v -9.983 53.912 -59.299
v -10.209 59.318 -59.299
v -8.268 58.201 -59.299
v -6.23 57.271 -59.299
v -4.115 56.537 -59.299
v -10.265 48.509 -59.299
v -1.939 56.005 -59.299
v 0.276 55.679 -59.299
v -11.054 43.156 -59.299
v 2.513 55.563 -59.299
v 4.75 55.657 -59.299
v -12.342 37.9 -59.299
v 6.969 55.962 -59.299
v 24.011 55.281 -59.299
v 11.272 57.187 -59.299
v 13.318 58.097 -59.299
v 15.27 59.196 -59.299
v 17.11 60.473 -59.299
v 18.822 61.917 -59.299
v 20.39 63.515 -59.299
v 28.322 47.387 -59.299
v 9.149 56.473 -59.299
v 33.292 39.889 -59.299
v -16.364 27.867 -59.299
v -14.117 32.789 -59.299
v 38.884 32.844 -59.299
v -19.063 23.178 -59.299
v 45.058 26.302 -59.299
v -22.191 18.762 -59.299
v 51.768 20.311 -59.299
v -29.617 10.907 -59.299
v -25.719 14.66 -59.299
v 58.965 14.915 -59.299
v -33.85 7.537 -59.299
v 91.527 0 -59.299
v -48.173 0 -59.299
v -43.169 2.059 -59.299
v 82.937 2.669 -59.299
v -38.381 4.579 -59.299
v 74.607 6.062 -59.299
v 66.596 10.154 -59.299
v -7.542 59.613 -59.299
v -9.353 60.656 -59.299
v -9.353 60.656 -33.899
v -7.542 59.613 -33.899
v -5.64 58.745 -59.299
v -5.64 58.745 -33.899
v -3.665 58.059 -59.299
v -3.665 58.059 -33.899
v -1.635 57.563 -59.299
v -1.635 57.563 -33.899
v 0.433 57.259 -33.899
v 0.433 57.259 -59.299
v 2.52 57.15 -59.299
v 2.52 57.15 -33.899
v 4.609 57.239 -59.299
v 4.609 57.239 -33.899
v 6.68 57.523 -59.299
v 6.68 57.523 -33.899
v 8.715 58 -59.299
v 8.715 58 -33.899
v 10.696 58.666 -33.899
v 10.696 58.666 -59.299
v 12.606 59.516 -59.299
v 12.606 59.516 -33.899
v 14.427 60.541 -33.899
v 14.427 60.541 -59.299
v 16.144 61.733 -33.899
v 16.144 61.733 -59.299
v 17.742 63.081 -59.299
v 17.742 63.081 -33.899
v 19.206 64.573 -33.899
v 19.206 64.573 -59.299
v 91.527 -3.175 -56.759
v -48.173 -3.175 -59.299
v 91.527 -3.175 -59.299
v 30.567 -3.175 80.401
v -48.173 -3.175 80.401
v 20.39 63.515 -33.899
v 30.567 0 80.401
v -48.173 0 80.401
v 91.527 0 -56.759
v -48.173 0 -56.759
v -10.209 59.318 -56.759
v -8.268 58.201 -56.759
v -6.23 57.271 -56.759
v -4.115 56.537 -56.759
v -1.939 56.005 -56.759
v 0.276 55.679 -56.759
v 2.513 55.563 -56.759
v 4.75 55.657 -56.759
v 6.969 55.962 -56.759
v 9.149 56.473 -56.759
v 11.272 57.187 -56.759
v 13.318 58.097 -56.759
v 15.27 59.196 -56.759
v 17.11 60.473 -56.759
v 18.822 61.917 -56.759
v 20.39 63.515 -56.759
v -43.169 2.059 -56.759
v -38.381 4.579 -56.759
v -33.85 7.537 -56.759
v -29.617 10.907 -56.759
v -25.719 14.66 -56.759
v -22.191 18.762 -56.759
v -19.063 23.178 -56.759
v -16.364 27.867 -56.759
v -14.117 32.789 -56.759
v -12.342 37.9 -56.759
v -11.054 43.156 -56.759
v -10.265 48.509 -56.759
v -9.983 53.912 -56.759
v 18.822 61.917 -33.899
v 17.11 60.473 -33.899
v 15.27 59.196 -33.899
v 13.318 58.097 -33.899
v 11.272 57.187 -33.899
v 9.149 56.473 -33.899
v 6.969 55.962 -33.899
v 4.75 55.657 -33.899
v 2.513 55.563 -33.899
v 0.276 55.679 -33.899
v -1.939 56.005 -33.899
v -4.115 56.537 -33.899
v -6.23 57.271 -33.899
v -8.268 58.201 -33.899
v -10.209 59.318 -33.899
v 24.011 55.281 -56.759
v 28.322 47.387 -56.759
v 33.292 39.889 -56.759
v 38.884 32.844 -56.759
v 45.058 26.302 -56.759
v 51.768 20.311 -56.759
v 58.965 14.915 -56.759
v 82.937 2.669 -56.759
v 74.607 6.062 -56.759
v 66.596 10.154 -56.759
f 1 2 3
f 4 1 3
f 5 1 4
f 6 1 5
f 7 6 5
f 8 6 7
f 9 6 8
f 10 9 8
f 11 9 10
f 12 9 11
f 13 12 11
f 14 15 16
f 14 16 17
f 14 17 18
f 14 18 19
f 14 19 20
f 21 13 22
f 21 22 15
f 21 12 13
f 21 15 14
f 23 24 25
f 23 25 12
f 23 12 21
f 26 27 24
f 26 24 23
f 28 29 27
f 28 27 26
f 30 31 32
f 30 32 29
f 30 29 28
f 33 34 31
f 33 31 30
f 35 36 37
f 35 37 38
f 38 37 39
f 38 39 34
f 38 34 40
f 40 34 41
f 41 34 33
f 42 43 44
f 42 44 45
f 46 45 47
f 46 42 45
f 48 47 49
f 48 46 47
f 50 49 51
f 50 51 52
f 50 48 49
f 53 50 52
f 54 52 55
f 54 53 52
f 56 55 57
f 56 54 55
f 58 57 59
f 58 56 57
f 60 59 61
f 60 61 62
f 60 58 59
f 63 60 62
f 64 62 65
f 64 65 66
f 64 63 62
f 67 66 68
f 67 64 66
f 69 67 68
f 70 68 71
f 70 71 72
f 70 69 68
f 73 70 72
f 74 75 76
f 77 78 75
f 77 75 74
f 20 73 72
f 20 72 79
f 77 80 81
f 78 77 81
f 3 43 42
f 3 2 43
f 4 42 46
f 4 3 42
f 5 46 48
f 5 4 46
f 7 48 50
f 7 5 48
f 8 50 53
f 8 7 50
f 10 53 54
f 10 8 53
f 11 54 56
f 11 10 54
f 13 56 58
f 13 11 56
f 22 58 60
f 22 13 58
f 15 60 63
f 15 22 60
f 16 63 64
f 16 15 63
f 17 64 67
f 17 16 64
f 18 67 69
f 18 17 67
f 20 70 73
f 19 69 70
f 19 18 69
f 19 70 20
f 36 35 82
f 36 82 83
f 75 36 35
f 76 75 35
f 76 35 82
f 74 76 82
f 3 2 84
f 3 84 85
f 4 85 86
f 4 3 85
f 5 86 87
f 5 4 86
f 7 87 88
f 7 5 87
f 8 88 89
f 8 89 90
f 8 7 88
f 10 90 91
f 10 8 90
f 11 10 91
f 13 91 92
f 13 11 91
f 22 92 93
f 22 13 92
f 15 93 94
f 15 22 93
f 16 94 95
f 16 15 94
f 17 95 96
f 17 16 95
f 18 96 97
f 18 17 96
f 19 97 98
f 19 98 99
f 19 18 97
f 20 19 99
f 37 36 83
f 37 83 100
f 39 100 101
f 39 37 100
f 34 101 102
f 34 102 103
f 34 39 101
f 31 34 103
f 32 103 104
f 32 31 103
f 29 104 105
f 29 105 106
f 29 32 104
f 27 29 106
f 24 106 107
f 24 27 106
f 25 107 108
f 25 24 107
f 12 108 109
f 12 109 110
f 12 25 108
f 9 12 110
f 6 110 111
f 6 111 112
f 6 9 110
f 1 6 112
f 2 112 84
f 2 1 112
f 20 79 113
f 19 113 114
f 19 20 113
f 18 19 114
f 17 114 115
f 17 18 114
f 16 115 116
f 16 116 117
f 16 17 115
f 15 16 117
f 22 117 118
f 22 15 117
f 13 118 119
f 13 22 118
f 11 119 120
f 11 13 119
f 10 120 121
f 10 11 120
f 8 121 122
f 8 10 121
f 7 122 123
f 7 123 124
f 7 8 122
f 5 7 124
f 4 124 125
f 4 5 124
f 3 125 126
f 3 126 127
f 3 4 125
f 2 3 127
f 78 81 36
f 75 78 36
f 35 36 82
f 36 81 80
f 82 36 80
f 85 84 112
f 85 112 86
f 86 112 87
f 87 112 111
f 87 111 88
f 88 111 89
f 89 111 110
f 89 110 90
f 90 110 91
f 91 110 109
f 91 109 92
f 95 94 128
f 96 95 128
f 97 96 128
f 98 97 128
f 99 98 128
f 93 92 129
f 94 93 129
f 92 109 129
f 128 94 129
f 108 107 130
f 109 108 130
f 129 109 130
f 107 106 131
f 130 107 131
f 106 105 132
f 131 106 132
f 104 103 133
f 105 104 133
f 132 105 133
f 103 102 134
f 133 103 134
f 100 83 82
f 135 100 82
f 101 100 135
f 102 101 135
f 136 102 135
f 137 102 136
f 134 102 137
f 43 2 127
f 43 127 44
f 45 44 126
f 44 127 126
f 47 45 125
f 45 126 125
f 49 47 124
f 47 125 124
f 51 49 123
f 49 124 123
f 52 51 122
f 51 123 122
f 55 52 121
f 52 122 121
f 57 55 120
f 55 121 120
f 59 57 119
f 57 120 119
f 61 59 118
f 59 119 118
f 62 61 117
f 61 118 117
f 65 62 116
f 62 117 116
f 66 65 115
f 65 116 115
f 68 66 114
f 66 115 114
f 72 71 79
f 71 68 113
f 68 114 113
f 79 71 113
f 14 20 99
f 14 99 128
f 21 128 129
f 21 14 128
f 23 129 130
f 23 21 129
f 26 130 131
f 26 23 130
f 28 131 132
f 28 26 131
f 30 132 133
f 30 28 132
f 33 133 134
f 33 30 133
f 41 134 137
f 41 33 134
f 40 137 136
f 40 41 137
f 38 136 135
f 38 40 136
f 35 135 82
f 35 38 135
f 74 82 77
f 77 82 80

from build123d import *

# Parameters (mm, degrees)
F1_DEPTH = 3.175
F3_DEPTH = 25.4
F5_DEPTH = 2.54


with BuildPart() as f1:
    # F0 (on Front) → F1 (new body)
    with BuildSketch(Plane.XZ):
        Polygon((-48.172619, 80.400523), (-48.172619, -59.299477), (91.527381, -59.299477), (91.527381, -56.759477), (30.567381, 80.400523), align=None)
    extrude(amount=F1_DEPTH)


with BuildPart() as f3:
    # F2 (on face) → F3 (new body)
    with BuildSketch(Plane(origin=(0, 0, -59.299477), x_dir=(1, 0, 0), z_dir=(0, 0, -1))):
        with BuildLine():
            ThreePointArc((-9.353087, -60.655518), (5.647591, -57.356168), (19.205846, -64.5728))
            Line((19.205846, -64.5728), (20.390022, -63.515499))
            ThreePointArc((20.390022, -63.515499), (5.86332, -55.783394), (-10.208835, -59.318412))
            Line((-10.208835, -59.318412), (-9.353087, -60.655518))
        make_face()
    extrude(amount=-F3_DEPTH)


with BuildPart() as f5:
    # F4 (on face) → F5 (new body)
    with BuildSketch(Plane(origin=(0, 0, -59.299477), x_dir=(1, 0, 0), z_dir=(0, 0, -1))):
        with BuildLine():
            ThreePointArc((-48.172619, 0), (-19.063419, -23.177729), (-10.208835, -59.318412))
            ThreePointArc((-10.208835, -59.318412), (5.86332, -55.783394), (20.390022, -63.515499))
            ThreePointArc((20.390022, -63.515499), (48.348567, -23.234399), (91.527381, 0))
            Line((91.527381, 0), (-48.172619, 0))
        make_face()
    extrude(amount=-F5_DEPTH)


solid = Compound([f1.part, f3.part, f5.part])
